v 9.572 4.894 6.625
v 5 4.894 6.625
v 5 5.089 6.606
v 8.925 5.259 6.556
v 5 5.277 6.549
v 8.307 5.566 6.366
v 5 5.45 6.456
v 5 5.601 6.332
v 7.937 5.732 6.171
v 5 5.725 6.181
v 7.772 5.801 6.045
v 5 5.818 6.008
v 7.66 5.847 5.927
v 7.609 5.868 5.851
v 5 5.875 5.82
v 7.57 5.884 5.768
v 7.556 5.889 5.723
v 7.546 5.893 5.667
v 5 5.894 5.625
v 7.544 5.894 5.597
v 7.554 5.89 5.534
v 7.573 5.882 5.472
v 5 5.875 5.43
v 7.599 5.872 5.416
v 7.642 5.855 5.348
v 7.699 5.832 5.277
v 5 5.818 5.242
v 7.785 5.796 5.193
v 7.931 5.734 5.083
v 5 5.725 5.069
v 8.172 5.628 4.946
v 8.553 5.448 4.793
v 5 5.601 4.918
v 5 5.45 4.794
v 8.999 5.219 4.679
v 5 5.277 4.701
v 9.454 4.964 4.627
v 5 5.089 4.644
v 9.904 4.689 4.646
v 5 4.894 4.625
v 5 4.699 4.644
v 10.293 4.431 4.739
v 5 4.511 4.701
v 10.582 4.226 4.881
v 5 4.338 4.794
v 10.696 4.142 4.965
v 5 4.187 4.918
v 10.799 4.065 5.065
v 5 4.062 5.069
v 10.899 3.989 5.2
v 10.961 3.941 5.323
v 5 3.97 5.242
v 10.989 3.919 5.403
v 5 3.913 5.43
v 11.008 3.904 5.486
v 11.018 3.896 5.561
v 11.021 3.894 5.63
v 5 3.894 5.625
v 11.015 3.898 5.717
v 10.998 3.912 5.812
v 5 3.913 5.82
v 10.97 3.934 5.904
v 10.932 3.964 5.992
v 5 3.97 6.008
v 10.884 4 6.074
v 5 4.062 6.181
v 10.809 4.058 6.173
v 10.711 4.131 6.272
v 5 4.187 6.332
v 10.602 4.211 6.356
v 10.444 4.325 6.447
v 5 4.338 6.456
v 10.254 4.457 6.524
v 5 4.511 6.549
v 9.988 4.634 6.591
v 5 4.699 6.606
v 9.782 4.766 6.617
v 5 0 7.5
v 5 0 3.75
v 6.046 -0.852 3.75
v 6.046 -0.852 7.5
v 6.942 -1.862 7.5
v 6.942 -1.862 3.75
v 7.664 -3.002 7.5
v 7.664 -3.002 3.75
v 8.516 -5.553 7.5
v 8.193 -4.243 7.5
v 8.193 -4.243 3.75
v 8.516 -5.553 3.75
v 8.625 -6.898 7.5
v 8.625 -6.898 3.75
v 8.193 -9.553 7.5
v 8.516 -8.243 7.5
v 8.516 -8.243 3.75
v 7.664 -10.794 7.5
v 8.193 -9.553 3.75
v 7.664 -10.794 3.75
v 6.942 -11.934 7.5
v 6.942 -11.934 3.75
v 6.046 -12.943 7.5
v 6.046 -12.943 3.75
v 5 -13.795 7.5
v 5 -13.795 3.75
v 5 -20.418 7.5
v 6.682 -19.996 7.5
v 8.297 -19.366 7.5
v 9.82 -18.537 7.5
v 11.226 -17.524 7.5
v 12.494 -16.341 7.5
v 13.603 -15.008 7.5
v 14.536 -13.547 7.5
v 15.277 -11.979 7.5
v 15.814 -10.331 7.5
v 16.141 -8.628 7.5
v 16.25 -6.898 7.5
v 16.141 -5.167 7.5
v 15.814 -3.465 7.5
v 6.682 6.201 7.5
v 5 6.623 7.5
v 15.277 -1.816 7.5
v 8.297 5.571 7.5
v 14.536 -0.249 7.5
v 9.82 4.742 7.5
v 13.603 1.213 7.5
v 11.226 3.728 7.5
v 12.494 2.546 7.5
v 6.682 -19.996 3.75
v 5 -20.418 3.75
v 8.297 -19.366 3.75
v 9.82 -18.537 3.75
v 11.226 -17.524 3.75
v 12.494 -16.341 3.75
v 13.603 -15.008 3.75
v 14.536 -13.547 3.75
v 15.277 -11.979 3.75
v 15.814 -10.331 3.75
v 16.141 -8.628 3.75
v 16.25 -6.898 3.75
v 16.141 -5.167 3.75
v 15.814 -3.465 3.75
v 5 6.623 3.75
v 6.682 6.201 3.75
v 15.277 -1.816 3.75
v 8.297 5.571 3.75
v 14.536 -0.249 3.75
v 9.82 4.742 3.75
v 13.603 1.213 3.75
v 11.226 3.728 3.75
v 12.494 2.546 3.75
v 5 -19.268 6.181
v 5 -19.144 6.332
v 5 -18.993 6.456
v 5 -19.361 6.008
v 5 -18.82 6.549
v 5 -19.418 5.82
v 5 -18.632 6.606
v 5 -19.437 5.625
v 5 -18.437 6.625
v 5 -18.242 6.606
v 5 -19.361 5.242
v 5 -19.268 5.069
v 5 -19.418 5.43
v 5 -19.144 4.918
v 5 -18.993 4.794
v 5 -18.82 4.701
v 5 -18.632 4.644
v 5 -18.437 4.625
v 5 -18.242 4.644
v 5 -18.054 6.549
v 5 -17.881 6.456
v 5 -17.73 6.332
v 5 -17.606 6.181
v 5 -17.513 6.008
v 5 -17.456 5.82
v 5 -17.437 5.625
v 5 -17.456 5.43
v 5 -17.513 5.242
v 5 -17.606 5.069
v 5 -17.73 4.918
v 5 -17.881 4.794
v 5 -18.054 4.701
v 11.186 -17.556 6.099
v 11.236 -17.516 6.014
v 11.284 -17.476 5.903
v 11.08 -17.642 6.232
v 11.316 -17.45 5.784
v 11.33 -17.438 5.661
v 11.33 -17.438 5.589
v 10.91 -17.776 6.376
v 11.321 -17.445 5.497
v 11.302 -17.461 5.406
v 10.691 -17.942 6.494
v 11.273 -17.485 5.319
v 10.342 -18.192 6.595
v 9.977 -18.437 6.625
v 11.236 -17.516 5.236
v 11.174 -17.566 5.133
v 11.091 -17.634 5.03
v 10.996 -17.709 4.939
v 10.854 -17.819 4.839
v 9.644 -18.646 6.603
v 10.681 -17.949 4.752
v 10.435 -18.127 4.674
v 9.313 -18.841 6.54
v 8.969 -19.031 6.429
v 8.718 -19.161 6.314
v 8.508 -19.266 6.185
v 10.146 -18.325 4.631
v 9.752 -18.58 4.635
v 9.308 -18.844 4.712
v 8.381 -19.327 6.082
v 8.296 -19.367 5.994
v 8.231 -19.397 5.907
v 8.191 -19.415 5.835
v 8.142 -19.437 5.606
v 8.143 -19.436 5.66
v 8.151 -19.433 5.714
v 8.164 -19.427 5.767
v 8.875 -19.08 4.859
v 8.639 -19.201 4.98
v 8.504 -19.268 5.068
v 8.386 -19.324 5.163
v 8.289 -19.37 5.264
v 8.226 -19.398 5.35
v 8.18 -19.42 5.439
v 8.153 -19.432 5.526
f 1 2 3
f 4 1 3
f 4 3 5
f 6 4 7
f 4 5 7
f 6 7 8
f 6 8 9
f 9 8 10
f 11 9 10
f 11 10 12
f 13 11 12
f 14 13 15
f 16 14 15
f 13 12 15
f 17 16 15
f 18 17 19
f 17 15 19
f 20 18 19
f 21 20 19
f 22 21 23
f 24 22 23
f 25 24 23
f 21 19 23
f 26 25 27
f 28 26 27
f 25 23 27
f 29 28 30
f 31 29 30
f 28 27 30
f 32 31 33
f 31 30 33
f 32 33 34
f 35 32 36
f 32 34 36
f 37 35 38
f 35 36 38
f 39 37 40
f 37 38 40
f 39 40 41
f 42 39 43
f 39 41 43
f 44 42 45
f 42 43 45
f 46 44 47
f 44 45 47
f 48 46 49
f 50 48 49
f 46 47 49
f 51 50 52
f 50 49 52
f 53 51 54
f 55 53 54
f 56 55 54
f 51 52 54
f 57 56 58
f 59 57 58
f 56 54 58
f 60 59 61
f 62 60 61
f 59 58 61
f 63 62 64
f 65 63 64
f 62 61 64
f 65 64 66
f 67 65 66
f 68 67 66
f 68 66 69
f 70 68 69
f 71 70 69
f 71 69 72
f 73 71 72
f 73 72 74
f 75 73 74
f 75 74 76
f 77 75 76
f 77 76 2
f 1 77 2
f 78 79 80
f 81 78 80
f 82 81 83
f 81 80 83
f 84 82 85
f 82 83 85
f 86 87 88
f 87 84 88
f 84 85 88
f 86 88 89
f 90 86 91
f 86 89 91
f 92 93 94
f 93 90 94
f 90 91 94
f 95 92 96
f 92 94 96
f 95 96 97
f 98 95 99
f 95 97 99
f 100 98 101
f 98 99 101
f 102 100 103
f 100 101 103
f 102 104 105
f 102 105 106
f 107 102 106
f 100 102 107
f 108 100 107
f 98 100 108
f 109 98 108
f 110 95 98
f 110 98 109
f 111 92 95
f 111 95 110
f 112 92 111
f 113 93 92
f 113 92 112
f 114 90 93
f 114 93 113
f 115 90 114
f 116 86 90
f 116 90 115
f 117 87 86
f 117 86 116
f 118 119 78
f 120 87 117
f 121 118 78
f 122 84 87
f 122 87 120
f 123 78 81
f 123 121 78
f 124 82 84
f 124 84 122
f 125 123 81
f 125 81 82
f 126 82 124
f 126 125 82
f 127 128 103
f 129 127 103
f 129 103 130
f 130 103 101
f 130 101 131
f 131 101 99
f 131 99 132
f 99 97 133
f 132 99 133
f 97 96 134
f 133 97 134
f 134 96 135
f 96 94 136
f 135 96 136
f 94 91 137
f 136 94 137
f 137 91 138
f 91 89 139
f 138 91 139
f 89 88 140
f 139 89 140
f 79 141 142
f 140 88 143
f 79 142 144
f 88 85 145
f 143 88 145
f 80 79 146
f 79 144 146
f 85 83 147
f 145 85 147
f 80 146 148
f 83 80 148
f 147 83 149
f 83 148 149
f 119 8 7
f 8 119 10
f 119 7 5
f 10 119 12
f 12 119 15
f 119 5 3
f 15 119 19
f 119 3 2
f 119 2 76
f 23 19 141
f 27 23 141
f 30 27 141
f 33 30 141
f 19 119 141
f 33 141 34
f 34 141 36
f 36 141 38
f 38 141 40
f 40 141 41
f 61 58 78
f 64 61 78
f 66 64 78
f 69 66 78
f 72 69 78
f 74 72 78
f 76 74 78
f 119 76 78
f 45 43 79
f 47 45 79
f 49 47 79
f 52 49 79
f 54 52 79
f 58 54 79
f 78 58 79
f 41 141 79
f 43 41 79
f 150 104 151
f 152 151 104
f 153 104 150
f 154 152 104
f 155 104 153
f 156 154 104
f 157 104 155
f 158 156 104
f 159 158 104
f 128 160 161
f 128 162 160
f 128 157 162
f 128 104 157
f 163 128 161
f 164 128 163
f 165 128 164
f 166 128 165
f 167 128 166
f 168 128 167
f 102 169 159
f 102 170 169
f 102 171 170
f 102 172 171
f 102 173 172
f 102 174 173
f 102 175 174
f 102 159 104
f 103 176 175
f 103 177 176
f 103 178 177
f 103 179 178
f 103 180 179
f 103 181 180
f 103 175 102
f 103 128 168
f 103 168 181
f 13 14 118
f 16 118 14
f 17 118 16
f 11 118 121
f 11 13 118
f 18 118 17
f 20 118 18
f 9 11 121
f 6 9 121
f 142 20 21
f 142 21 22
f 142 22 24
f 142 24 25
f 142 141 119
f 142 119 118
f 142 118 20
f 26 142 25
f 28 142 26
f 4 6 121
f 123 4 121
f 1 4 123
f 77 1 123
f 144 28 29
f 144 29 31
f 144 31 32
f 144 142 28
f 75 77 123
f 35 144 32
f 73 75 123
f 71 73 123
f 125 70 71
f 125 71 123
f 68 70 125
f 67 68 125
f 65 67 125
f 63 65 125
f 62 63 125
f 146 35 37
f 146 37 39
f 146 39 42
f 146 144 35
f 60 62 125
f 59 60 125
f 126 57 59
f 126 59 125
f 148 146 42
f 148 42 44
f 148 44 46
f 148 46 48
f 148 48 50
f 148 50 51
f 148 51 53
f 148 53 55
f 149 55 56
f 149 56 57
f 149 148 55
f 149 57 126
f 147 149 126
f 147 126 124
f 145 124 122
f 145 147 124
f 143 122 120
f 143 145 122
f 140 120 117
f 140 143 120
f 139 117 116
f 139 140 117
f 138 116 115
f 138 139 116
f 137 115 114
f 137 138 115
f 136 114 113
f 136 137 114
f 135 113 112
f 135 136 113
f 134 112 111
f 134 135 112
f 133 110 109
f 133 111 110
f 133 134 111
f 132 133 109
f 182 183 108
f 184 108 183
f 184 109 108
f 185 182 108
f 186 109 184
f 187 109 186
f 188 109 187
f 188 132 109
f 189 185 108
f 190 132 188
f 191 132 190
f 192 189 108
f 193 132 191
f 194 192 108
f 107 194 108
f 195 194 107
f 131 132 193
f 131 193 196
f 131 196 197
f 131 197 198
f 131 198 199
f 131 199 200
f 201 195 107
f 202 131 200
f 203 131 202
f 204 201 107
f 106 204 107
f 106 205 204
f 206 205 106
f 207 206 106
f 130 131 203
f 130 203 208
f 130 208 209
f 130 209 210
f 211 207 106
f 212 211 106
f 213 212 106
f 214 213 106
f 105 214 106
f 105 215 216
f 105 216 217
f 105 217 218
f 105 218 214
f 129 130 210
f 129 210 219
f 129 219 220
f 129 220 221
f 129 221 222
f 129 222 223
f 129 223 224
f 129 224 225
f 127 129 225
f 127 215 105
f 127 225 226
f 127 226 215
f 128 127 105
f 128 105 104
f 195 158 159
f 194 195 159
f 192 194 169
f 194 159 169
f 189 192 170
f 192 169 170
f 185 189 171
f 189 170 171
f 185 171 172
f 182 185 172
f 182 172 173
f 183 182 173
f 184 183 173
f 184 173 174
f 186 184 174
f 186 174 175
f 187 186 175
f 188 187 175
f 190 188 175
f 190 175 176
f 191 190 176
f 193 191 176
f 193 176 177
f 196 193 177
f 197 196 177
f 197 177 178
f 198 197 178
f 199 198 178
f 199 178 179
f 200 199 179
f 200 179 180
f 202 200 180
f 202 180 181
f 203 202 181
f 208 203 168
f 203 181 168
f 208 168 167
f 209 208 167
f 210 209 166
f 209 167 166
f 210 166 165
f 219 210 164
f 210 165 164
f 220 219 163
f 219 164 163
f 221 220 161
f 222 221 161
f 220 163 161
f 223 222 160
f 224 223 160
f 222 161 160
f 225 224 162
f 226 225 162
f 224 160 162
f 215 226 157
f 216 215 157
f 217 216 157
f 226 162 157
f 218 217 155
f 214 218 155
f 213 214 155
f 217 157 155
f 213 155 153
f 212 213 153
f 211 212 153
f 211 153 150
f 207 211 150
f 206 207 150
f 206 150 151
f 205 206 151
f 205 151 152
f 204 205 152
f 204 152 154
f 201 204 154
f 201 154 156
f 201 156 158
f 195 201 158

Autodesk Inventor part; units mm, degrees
ref_plane "YZ Plane" through (0, 0, 0) normal (1, 0, 0) x (0, 1, 0)
ref_plane "XZ Plane" through (0, 0, 0) normal (0, 1, 0) x (-1, 0, 0)
ref_plane "XY Plane" through (0, 0, 0) normal (0, 0, 1) x (1, 0, 0)
sketch "Sketch1" plane through (0, 0, 0) normal (0, 0, 1) x (1, 0, 0)
  arc A0 (5, -27.0416) -> (5, 27.0416) centre (0, 0) ccw
  line L0 (9.25, 0) -> (0.933, 0)
  line L1 (5, -27.5) -> (5, -13.7954)
  arc A1 (5, -13.7954) -> (5, 13.7954) centre (-4.5, 0) ccw
  arc A2 (5, -27.0416) -> (5, 27.0416) centre (0, 0) ccw
  line L2 (5, 27.5) -> (5, 13.7954)
  line L3 (5, -13.7954) -> (5, -27.5)
  point P0 (-3.7885, 24.6247)
extrude "Extrusion1" add sketch "Sketch1" along normal blind 7.5
sketch "Sketch3" plane through (5, -27.0416, 0) normal (-1, 0, 0) x (0, 0, 1)
  line L0 (0, 6.9167) -> (7.5, 6.9167)
  line L1 (0, 0) -> (0, 6.9167)
  line L2 (0, 6.9167) -> (7.5, 6.9167)
  line L3 (7.5, 26.7893) -> (7.5, 0)
  line L4 (7.5, 6.9167) -> (7.5, 0)
  line L5 (7.5, 0) -> (0, 0)
  line L6 (7.5, 0) -> (0, 0)
  circle A0 centre (3.75, 3.963) radius 1
  line L7 (0, 0) -> (0, 53.5786)
  line L8 (0, 53.5786) -> (0, 0)
  line L9 (0, 26.7893) -> (7.5, 26.7893)
  circle A1 centre (3.75, 50.6249) radius 1
  line L10 (0, 53.5786) -> (7.5, 53.5786)
  line L11 (7.5, 53.5786) -> (7.5, 0)
  line L12 (7.5, 54.0833) -> (0.9403, 54.0833)
  line L13 (0, 54.0833) -> (7.5, 54.0833) projected
  circle A2 centre (3.75, 3.963) radius 2
  circle A3 centre (3.75, 50.6249) radius 2
  point P0 (0, 27.0416)
  point P1 (280.32, 51.414)
  dimension "d7" = 2
  dimension "d10" = 4
  dimension "d11" = 4
extrude "Extrusion3" cut sketch "Sketch3" against normal blind 25.4 contours A0 | A1
extrude "Extrusion4" cut sketch "Sketch3" against normal blind 17.9375 contours A2 | A3
scale "Scale1" factors (0.5, 0.5, 0.5) then translate (2.5, -6.8977, 3.75) bodies 1
properties part number "Contrapeso2"
